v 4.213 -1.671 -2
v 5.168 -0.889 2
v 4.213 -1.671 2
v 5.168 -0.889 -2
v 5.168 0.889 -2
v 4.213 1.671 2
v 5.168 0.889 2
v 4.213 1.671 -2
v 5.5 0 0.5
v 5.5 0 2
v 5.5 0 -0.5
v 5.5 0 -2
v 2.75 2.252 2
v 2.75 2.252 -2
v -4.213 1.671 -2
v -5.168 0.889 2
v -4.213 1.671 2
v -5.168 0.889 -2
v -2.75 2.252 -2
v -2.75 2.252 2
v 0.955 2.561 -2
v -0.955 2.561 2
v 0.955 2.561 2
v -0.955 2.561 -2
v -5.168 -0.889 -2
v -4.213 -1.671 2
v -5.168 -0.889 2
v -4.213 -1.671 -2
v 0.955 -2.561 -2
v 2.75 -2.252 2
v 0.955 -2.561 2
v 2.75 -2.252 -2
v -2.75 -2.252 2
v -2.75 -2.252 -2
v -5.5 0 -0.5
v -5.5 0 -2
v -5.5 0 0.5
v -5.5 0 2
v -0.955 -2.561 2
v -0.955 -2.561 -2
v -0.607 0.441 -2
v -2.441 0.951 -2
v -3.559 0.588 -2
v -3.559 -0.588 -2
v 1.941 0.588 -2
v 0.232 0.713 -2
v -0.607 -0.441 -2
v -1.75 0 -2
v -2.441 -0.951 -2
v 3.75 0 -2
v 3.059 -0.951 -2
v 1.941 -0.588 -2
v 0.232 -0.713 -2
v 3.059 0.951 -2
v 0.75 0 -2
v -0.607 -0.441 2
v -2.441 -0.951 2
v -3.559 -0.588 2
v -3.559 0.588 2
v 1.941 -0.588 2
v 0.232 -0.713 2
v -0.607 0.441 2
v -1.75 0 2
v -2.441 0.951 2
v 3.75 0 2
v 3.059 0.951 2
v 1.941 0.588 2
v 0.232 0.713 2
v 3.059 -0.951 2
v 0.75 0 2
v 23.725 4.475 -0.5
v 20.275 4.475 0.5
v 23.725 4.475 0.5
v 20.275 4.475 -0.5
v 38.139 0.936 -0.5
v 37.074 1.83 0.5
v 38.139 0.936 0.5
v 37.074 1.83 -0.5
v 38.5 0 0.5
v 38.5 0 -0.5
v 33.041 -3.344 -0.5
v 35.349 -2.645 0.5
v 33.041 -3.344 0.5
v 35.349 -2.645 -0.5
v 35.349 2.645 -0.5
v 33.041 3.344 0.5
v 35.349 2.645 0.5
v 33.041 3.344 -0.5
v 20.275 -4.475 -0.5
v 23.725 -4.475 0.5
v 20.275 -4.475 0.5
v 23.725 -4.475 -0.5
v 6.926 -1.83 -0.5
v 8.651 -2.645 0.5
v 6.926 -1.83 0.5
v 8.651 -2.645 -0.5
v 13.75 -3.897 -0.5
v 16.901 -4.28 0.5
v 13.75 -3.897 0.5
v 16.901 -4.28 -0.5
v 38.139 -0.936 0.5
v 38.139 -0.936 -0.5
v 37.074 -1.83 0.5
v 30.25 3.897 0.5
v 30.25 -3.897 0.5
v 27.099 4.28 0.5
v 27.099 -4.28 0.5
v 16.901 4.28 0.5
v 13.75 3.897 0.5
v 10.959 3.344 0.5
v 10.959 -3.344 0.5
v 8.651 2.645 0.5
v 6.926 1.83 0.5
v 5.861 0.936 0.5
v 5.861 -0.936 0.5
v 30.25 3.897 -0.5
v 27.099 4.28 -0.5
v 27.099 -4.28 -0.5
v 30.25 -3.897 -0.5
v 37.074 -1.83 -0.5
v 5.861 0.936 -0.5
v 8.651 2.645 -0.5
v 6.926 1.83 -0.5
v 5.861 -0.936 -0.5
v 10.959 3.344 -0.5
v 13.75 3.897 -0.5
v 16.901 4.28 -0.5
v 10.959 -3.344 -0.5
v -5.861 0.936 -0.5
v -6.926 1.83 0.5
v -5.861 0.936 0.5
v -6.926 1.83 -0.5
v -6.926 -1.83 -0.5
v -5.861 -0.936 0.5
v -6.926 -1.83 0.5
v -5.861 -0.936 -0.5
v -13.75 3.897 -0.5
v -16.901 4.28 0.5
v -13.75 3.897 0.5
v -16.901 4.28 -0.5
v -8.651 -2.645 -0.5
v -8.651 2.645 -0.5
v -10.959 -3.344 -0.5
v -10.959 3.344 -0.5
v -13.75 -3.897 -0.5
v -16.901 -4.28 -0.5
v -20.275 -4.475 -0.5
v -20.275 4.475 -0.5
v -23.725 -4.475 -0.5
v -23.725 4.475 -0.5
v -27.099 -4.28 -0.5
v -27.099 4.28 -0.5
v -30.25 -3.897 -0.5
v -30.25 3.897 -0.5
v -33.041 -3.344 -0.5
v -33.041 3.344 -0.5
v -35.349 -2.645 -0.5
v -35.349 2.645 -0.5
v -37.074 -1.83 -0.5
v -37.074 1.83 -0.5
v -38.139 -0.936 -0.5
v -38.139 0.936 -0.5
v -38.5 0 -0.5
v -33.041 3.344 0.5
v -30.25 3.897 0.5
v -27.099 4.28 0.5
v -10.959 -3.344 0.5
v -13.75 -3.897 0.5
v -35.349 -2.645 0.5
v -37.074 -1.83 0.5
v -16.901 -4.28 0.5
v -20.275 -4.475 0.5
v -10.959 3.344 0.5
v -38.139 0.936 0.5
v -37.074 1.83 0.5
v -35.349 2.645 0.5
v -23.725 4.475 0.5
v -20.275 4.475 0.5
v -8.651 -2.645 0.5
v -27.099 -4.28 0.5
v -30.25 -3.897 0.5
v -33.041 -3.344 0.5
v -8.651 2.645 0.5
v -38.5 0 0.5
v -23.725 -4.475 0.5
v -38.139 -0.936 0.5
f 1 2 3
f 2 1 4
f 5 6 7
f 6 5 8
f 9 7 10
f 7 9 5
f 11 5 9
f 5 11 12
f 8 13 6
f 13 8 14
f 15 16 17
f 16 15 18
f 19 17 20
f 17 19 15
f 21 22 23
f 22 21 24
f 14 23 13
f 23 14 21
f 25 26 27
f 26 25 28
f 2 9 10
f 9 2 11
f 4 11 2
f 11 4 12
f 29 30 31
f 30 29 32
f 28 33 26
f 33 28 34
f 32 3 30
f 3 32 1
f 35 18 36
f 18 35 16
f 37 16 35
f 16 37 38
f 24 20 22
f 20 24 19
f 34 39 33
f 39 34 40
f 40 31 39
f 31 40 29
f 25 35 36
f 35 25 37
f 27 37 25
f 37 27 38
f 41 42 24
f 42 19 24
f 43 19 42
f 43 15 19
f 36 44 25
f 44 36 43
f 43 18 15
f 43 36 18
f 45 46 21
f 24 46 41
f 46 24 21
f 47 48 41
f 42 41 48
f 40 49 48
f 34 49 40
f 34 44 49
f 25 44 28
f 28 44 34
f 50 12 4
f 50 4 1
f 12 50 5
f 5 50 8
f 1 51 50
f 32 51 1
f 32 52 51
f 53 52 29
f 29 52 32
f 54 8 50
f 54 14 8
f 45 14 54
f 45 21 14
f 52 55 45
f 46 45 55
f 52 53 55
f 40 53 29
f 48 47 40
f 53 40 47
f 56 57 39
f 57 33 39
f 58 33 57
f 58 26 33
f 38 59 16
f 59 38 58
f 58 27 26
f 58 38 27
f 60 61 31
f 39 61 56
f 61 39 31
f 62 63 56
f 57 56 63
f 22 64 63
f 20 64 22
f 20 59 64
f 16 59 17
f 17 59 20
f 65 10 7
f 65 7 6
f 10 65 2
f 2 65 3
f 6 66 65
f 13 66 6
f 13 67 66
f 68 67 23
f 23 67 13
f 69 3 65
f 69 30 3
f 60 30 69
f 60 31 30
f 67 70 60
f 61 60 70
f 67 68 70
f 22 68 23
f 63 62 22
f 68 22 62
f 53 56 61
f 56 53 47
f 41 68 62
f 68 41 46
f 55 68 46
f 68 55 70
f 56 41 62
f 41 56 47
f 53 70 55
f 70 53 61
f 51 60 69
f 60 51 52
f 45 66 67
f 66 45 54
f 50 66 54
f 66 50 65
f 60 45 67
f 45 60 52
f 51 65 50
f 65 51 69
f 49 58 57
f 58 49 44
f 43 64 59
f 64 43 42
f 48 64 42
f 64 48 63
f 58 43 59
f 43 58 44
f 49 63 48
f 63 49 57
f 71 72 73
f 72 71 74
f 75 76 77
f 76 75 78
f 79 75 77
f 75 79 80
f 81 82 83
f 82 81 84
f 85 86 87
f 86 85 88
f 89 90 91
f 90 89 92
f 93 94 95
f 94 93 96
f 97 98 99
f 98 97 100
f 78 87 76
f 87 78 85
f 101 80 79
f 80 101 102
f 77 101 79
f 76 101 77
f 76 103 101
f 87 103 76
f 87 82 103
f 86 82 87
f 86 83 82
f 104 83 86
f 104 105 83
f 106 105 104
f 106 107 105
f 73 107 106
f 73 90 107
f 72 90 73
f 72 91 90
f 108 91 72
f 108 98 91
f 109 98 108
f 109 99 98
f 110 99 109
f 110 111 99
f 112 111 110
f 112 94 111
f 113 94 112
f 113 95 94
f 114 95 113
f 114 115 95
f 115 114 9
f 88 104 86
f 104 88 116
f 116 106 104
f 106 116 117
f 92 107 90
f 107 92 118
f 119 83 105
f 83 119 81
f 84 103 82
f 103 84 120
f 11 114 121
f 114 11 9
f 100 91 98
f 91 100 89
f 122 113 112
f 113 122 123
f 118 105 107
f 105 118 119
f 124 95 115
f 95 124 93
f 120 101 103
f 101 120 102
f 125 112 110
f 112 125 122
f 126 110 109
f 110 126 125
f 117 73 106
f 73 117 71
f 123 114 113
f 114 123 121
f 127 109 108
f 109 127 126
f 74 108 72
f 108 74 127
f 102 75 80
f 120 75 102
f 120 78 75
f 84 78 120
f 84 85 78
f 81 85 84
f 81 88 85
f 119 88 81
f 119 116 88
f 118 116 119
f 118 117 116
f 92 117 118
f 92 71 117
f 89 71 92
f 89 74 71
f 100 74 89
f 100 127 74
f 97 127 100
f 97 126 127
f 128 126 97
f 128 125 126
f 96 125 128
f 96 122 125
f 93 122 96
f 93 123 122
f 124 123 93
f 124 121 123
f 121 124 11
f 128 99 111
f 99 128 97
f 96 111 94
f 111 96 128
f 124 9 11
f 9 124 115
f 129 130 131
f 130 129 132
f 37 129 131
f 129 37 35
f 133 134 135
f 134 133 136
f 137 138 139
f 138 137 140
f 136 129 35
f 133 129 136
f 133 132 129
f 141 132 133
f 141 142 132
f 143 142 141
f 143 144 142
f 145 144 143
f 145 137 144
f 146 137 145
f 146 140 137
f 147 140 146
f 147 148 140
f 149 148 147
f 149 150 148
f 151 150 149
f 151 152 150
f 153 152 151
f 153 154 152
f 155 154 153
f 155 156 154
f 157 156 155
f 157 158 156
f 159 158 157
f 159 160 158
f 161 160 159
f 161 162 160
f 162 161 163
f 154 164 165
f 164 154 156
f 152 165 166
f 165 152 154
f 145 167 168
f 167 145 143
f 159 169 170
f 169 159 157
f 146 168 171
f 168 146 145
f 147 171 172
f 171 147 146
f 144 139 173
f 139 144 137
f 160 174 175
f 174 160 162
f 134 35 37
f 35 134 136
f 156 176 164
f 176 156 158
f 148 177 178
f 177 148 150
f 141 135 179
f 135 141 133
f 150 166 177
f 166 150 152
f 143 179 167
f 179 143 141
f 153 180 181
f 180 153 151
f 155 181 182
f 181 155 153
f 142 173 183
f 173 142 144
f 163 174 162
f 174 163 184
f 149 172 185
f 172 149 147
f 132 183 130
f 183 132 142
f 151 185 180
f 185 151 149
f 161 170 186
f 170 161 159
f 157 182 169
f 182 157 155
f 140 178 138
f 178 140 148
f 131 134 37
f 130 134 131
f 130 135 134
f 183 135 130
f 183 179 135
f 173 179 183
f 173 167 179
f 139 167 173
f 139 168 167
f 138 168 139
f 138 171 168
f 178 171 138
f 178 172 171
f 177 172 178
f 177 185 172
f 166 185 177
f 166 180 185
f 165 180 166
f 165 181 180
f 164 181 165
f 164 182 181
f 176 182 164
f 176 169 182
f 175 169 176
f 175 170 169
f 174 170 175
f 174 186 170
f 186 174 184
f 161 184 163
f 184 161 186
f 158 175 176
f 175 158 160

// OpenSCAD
color("DarkOrange") {
	_hubX = 11;
	_hubY = 5.2;
	_hubZ = 4;

	_bladeX = 33;
	_bladeY = 9;

	_shaftR = 0.75;
	_tMountR = 1;
	
	translate([_bladeX  - _hubX, 0, 0]) {
		scale([1, _bladeY / _bladeX, 1]) {
			cylinder(d = _bladeX, h = 1, center = true);
		}
	}
	translate([-_bladeX  + _hubX, 0, 0]) {
		scale([1, _bladeY / _bladeX, 1]) {
			cylinder(d = _bladeX, h = 1, center = true);
		}
	}
	render() difference() {
		// The hub
		scale([1, _hubY / _hubX, 1]) {
			cylinder(d = _hubX, h = _hubZ, center = true);
		}

		// Subtract the drive shaft & screw holes
		// Drive shaft
		cylinder(r = _shaftR, h = _hubZ, center = true);
		// Right bell mount
		translate([_hubX / 4, 0, 0]) {
			cylinder(r = _tMountR, h = _hubZ, center = true);
		}
		// Left bell mount
		translate([-_hubX / 4, 0, 0]) {
			cylinder(r = _tMountR, h = _hubZ, center = true);
		}
	}
	
}
